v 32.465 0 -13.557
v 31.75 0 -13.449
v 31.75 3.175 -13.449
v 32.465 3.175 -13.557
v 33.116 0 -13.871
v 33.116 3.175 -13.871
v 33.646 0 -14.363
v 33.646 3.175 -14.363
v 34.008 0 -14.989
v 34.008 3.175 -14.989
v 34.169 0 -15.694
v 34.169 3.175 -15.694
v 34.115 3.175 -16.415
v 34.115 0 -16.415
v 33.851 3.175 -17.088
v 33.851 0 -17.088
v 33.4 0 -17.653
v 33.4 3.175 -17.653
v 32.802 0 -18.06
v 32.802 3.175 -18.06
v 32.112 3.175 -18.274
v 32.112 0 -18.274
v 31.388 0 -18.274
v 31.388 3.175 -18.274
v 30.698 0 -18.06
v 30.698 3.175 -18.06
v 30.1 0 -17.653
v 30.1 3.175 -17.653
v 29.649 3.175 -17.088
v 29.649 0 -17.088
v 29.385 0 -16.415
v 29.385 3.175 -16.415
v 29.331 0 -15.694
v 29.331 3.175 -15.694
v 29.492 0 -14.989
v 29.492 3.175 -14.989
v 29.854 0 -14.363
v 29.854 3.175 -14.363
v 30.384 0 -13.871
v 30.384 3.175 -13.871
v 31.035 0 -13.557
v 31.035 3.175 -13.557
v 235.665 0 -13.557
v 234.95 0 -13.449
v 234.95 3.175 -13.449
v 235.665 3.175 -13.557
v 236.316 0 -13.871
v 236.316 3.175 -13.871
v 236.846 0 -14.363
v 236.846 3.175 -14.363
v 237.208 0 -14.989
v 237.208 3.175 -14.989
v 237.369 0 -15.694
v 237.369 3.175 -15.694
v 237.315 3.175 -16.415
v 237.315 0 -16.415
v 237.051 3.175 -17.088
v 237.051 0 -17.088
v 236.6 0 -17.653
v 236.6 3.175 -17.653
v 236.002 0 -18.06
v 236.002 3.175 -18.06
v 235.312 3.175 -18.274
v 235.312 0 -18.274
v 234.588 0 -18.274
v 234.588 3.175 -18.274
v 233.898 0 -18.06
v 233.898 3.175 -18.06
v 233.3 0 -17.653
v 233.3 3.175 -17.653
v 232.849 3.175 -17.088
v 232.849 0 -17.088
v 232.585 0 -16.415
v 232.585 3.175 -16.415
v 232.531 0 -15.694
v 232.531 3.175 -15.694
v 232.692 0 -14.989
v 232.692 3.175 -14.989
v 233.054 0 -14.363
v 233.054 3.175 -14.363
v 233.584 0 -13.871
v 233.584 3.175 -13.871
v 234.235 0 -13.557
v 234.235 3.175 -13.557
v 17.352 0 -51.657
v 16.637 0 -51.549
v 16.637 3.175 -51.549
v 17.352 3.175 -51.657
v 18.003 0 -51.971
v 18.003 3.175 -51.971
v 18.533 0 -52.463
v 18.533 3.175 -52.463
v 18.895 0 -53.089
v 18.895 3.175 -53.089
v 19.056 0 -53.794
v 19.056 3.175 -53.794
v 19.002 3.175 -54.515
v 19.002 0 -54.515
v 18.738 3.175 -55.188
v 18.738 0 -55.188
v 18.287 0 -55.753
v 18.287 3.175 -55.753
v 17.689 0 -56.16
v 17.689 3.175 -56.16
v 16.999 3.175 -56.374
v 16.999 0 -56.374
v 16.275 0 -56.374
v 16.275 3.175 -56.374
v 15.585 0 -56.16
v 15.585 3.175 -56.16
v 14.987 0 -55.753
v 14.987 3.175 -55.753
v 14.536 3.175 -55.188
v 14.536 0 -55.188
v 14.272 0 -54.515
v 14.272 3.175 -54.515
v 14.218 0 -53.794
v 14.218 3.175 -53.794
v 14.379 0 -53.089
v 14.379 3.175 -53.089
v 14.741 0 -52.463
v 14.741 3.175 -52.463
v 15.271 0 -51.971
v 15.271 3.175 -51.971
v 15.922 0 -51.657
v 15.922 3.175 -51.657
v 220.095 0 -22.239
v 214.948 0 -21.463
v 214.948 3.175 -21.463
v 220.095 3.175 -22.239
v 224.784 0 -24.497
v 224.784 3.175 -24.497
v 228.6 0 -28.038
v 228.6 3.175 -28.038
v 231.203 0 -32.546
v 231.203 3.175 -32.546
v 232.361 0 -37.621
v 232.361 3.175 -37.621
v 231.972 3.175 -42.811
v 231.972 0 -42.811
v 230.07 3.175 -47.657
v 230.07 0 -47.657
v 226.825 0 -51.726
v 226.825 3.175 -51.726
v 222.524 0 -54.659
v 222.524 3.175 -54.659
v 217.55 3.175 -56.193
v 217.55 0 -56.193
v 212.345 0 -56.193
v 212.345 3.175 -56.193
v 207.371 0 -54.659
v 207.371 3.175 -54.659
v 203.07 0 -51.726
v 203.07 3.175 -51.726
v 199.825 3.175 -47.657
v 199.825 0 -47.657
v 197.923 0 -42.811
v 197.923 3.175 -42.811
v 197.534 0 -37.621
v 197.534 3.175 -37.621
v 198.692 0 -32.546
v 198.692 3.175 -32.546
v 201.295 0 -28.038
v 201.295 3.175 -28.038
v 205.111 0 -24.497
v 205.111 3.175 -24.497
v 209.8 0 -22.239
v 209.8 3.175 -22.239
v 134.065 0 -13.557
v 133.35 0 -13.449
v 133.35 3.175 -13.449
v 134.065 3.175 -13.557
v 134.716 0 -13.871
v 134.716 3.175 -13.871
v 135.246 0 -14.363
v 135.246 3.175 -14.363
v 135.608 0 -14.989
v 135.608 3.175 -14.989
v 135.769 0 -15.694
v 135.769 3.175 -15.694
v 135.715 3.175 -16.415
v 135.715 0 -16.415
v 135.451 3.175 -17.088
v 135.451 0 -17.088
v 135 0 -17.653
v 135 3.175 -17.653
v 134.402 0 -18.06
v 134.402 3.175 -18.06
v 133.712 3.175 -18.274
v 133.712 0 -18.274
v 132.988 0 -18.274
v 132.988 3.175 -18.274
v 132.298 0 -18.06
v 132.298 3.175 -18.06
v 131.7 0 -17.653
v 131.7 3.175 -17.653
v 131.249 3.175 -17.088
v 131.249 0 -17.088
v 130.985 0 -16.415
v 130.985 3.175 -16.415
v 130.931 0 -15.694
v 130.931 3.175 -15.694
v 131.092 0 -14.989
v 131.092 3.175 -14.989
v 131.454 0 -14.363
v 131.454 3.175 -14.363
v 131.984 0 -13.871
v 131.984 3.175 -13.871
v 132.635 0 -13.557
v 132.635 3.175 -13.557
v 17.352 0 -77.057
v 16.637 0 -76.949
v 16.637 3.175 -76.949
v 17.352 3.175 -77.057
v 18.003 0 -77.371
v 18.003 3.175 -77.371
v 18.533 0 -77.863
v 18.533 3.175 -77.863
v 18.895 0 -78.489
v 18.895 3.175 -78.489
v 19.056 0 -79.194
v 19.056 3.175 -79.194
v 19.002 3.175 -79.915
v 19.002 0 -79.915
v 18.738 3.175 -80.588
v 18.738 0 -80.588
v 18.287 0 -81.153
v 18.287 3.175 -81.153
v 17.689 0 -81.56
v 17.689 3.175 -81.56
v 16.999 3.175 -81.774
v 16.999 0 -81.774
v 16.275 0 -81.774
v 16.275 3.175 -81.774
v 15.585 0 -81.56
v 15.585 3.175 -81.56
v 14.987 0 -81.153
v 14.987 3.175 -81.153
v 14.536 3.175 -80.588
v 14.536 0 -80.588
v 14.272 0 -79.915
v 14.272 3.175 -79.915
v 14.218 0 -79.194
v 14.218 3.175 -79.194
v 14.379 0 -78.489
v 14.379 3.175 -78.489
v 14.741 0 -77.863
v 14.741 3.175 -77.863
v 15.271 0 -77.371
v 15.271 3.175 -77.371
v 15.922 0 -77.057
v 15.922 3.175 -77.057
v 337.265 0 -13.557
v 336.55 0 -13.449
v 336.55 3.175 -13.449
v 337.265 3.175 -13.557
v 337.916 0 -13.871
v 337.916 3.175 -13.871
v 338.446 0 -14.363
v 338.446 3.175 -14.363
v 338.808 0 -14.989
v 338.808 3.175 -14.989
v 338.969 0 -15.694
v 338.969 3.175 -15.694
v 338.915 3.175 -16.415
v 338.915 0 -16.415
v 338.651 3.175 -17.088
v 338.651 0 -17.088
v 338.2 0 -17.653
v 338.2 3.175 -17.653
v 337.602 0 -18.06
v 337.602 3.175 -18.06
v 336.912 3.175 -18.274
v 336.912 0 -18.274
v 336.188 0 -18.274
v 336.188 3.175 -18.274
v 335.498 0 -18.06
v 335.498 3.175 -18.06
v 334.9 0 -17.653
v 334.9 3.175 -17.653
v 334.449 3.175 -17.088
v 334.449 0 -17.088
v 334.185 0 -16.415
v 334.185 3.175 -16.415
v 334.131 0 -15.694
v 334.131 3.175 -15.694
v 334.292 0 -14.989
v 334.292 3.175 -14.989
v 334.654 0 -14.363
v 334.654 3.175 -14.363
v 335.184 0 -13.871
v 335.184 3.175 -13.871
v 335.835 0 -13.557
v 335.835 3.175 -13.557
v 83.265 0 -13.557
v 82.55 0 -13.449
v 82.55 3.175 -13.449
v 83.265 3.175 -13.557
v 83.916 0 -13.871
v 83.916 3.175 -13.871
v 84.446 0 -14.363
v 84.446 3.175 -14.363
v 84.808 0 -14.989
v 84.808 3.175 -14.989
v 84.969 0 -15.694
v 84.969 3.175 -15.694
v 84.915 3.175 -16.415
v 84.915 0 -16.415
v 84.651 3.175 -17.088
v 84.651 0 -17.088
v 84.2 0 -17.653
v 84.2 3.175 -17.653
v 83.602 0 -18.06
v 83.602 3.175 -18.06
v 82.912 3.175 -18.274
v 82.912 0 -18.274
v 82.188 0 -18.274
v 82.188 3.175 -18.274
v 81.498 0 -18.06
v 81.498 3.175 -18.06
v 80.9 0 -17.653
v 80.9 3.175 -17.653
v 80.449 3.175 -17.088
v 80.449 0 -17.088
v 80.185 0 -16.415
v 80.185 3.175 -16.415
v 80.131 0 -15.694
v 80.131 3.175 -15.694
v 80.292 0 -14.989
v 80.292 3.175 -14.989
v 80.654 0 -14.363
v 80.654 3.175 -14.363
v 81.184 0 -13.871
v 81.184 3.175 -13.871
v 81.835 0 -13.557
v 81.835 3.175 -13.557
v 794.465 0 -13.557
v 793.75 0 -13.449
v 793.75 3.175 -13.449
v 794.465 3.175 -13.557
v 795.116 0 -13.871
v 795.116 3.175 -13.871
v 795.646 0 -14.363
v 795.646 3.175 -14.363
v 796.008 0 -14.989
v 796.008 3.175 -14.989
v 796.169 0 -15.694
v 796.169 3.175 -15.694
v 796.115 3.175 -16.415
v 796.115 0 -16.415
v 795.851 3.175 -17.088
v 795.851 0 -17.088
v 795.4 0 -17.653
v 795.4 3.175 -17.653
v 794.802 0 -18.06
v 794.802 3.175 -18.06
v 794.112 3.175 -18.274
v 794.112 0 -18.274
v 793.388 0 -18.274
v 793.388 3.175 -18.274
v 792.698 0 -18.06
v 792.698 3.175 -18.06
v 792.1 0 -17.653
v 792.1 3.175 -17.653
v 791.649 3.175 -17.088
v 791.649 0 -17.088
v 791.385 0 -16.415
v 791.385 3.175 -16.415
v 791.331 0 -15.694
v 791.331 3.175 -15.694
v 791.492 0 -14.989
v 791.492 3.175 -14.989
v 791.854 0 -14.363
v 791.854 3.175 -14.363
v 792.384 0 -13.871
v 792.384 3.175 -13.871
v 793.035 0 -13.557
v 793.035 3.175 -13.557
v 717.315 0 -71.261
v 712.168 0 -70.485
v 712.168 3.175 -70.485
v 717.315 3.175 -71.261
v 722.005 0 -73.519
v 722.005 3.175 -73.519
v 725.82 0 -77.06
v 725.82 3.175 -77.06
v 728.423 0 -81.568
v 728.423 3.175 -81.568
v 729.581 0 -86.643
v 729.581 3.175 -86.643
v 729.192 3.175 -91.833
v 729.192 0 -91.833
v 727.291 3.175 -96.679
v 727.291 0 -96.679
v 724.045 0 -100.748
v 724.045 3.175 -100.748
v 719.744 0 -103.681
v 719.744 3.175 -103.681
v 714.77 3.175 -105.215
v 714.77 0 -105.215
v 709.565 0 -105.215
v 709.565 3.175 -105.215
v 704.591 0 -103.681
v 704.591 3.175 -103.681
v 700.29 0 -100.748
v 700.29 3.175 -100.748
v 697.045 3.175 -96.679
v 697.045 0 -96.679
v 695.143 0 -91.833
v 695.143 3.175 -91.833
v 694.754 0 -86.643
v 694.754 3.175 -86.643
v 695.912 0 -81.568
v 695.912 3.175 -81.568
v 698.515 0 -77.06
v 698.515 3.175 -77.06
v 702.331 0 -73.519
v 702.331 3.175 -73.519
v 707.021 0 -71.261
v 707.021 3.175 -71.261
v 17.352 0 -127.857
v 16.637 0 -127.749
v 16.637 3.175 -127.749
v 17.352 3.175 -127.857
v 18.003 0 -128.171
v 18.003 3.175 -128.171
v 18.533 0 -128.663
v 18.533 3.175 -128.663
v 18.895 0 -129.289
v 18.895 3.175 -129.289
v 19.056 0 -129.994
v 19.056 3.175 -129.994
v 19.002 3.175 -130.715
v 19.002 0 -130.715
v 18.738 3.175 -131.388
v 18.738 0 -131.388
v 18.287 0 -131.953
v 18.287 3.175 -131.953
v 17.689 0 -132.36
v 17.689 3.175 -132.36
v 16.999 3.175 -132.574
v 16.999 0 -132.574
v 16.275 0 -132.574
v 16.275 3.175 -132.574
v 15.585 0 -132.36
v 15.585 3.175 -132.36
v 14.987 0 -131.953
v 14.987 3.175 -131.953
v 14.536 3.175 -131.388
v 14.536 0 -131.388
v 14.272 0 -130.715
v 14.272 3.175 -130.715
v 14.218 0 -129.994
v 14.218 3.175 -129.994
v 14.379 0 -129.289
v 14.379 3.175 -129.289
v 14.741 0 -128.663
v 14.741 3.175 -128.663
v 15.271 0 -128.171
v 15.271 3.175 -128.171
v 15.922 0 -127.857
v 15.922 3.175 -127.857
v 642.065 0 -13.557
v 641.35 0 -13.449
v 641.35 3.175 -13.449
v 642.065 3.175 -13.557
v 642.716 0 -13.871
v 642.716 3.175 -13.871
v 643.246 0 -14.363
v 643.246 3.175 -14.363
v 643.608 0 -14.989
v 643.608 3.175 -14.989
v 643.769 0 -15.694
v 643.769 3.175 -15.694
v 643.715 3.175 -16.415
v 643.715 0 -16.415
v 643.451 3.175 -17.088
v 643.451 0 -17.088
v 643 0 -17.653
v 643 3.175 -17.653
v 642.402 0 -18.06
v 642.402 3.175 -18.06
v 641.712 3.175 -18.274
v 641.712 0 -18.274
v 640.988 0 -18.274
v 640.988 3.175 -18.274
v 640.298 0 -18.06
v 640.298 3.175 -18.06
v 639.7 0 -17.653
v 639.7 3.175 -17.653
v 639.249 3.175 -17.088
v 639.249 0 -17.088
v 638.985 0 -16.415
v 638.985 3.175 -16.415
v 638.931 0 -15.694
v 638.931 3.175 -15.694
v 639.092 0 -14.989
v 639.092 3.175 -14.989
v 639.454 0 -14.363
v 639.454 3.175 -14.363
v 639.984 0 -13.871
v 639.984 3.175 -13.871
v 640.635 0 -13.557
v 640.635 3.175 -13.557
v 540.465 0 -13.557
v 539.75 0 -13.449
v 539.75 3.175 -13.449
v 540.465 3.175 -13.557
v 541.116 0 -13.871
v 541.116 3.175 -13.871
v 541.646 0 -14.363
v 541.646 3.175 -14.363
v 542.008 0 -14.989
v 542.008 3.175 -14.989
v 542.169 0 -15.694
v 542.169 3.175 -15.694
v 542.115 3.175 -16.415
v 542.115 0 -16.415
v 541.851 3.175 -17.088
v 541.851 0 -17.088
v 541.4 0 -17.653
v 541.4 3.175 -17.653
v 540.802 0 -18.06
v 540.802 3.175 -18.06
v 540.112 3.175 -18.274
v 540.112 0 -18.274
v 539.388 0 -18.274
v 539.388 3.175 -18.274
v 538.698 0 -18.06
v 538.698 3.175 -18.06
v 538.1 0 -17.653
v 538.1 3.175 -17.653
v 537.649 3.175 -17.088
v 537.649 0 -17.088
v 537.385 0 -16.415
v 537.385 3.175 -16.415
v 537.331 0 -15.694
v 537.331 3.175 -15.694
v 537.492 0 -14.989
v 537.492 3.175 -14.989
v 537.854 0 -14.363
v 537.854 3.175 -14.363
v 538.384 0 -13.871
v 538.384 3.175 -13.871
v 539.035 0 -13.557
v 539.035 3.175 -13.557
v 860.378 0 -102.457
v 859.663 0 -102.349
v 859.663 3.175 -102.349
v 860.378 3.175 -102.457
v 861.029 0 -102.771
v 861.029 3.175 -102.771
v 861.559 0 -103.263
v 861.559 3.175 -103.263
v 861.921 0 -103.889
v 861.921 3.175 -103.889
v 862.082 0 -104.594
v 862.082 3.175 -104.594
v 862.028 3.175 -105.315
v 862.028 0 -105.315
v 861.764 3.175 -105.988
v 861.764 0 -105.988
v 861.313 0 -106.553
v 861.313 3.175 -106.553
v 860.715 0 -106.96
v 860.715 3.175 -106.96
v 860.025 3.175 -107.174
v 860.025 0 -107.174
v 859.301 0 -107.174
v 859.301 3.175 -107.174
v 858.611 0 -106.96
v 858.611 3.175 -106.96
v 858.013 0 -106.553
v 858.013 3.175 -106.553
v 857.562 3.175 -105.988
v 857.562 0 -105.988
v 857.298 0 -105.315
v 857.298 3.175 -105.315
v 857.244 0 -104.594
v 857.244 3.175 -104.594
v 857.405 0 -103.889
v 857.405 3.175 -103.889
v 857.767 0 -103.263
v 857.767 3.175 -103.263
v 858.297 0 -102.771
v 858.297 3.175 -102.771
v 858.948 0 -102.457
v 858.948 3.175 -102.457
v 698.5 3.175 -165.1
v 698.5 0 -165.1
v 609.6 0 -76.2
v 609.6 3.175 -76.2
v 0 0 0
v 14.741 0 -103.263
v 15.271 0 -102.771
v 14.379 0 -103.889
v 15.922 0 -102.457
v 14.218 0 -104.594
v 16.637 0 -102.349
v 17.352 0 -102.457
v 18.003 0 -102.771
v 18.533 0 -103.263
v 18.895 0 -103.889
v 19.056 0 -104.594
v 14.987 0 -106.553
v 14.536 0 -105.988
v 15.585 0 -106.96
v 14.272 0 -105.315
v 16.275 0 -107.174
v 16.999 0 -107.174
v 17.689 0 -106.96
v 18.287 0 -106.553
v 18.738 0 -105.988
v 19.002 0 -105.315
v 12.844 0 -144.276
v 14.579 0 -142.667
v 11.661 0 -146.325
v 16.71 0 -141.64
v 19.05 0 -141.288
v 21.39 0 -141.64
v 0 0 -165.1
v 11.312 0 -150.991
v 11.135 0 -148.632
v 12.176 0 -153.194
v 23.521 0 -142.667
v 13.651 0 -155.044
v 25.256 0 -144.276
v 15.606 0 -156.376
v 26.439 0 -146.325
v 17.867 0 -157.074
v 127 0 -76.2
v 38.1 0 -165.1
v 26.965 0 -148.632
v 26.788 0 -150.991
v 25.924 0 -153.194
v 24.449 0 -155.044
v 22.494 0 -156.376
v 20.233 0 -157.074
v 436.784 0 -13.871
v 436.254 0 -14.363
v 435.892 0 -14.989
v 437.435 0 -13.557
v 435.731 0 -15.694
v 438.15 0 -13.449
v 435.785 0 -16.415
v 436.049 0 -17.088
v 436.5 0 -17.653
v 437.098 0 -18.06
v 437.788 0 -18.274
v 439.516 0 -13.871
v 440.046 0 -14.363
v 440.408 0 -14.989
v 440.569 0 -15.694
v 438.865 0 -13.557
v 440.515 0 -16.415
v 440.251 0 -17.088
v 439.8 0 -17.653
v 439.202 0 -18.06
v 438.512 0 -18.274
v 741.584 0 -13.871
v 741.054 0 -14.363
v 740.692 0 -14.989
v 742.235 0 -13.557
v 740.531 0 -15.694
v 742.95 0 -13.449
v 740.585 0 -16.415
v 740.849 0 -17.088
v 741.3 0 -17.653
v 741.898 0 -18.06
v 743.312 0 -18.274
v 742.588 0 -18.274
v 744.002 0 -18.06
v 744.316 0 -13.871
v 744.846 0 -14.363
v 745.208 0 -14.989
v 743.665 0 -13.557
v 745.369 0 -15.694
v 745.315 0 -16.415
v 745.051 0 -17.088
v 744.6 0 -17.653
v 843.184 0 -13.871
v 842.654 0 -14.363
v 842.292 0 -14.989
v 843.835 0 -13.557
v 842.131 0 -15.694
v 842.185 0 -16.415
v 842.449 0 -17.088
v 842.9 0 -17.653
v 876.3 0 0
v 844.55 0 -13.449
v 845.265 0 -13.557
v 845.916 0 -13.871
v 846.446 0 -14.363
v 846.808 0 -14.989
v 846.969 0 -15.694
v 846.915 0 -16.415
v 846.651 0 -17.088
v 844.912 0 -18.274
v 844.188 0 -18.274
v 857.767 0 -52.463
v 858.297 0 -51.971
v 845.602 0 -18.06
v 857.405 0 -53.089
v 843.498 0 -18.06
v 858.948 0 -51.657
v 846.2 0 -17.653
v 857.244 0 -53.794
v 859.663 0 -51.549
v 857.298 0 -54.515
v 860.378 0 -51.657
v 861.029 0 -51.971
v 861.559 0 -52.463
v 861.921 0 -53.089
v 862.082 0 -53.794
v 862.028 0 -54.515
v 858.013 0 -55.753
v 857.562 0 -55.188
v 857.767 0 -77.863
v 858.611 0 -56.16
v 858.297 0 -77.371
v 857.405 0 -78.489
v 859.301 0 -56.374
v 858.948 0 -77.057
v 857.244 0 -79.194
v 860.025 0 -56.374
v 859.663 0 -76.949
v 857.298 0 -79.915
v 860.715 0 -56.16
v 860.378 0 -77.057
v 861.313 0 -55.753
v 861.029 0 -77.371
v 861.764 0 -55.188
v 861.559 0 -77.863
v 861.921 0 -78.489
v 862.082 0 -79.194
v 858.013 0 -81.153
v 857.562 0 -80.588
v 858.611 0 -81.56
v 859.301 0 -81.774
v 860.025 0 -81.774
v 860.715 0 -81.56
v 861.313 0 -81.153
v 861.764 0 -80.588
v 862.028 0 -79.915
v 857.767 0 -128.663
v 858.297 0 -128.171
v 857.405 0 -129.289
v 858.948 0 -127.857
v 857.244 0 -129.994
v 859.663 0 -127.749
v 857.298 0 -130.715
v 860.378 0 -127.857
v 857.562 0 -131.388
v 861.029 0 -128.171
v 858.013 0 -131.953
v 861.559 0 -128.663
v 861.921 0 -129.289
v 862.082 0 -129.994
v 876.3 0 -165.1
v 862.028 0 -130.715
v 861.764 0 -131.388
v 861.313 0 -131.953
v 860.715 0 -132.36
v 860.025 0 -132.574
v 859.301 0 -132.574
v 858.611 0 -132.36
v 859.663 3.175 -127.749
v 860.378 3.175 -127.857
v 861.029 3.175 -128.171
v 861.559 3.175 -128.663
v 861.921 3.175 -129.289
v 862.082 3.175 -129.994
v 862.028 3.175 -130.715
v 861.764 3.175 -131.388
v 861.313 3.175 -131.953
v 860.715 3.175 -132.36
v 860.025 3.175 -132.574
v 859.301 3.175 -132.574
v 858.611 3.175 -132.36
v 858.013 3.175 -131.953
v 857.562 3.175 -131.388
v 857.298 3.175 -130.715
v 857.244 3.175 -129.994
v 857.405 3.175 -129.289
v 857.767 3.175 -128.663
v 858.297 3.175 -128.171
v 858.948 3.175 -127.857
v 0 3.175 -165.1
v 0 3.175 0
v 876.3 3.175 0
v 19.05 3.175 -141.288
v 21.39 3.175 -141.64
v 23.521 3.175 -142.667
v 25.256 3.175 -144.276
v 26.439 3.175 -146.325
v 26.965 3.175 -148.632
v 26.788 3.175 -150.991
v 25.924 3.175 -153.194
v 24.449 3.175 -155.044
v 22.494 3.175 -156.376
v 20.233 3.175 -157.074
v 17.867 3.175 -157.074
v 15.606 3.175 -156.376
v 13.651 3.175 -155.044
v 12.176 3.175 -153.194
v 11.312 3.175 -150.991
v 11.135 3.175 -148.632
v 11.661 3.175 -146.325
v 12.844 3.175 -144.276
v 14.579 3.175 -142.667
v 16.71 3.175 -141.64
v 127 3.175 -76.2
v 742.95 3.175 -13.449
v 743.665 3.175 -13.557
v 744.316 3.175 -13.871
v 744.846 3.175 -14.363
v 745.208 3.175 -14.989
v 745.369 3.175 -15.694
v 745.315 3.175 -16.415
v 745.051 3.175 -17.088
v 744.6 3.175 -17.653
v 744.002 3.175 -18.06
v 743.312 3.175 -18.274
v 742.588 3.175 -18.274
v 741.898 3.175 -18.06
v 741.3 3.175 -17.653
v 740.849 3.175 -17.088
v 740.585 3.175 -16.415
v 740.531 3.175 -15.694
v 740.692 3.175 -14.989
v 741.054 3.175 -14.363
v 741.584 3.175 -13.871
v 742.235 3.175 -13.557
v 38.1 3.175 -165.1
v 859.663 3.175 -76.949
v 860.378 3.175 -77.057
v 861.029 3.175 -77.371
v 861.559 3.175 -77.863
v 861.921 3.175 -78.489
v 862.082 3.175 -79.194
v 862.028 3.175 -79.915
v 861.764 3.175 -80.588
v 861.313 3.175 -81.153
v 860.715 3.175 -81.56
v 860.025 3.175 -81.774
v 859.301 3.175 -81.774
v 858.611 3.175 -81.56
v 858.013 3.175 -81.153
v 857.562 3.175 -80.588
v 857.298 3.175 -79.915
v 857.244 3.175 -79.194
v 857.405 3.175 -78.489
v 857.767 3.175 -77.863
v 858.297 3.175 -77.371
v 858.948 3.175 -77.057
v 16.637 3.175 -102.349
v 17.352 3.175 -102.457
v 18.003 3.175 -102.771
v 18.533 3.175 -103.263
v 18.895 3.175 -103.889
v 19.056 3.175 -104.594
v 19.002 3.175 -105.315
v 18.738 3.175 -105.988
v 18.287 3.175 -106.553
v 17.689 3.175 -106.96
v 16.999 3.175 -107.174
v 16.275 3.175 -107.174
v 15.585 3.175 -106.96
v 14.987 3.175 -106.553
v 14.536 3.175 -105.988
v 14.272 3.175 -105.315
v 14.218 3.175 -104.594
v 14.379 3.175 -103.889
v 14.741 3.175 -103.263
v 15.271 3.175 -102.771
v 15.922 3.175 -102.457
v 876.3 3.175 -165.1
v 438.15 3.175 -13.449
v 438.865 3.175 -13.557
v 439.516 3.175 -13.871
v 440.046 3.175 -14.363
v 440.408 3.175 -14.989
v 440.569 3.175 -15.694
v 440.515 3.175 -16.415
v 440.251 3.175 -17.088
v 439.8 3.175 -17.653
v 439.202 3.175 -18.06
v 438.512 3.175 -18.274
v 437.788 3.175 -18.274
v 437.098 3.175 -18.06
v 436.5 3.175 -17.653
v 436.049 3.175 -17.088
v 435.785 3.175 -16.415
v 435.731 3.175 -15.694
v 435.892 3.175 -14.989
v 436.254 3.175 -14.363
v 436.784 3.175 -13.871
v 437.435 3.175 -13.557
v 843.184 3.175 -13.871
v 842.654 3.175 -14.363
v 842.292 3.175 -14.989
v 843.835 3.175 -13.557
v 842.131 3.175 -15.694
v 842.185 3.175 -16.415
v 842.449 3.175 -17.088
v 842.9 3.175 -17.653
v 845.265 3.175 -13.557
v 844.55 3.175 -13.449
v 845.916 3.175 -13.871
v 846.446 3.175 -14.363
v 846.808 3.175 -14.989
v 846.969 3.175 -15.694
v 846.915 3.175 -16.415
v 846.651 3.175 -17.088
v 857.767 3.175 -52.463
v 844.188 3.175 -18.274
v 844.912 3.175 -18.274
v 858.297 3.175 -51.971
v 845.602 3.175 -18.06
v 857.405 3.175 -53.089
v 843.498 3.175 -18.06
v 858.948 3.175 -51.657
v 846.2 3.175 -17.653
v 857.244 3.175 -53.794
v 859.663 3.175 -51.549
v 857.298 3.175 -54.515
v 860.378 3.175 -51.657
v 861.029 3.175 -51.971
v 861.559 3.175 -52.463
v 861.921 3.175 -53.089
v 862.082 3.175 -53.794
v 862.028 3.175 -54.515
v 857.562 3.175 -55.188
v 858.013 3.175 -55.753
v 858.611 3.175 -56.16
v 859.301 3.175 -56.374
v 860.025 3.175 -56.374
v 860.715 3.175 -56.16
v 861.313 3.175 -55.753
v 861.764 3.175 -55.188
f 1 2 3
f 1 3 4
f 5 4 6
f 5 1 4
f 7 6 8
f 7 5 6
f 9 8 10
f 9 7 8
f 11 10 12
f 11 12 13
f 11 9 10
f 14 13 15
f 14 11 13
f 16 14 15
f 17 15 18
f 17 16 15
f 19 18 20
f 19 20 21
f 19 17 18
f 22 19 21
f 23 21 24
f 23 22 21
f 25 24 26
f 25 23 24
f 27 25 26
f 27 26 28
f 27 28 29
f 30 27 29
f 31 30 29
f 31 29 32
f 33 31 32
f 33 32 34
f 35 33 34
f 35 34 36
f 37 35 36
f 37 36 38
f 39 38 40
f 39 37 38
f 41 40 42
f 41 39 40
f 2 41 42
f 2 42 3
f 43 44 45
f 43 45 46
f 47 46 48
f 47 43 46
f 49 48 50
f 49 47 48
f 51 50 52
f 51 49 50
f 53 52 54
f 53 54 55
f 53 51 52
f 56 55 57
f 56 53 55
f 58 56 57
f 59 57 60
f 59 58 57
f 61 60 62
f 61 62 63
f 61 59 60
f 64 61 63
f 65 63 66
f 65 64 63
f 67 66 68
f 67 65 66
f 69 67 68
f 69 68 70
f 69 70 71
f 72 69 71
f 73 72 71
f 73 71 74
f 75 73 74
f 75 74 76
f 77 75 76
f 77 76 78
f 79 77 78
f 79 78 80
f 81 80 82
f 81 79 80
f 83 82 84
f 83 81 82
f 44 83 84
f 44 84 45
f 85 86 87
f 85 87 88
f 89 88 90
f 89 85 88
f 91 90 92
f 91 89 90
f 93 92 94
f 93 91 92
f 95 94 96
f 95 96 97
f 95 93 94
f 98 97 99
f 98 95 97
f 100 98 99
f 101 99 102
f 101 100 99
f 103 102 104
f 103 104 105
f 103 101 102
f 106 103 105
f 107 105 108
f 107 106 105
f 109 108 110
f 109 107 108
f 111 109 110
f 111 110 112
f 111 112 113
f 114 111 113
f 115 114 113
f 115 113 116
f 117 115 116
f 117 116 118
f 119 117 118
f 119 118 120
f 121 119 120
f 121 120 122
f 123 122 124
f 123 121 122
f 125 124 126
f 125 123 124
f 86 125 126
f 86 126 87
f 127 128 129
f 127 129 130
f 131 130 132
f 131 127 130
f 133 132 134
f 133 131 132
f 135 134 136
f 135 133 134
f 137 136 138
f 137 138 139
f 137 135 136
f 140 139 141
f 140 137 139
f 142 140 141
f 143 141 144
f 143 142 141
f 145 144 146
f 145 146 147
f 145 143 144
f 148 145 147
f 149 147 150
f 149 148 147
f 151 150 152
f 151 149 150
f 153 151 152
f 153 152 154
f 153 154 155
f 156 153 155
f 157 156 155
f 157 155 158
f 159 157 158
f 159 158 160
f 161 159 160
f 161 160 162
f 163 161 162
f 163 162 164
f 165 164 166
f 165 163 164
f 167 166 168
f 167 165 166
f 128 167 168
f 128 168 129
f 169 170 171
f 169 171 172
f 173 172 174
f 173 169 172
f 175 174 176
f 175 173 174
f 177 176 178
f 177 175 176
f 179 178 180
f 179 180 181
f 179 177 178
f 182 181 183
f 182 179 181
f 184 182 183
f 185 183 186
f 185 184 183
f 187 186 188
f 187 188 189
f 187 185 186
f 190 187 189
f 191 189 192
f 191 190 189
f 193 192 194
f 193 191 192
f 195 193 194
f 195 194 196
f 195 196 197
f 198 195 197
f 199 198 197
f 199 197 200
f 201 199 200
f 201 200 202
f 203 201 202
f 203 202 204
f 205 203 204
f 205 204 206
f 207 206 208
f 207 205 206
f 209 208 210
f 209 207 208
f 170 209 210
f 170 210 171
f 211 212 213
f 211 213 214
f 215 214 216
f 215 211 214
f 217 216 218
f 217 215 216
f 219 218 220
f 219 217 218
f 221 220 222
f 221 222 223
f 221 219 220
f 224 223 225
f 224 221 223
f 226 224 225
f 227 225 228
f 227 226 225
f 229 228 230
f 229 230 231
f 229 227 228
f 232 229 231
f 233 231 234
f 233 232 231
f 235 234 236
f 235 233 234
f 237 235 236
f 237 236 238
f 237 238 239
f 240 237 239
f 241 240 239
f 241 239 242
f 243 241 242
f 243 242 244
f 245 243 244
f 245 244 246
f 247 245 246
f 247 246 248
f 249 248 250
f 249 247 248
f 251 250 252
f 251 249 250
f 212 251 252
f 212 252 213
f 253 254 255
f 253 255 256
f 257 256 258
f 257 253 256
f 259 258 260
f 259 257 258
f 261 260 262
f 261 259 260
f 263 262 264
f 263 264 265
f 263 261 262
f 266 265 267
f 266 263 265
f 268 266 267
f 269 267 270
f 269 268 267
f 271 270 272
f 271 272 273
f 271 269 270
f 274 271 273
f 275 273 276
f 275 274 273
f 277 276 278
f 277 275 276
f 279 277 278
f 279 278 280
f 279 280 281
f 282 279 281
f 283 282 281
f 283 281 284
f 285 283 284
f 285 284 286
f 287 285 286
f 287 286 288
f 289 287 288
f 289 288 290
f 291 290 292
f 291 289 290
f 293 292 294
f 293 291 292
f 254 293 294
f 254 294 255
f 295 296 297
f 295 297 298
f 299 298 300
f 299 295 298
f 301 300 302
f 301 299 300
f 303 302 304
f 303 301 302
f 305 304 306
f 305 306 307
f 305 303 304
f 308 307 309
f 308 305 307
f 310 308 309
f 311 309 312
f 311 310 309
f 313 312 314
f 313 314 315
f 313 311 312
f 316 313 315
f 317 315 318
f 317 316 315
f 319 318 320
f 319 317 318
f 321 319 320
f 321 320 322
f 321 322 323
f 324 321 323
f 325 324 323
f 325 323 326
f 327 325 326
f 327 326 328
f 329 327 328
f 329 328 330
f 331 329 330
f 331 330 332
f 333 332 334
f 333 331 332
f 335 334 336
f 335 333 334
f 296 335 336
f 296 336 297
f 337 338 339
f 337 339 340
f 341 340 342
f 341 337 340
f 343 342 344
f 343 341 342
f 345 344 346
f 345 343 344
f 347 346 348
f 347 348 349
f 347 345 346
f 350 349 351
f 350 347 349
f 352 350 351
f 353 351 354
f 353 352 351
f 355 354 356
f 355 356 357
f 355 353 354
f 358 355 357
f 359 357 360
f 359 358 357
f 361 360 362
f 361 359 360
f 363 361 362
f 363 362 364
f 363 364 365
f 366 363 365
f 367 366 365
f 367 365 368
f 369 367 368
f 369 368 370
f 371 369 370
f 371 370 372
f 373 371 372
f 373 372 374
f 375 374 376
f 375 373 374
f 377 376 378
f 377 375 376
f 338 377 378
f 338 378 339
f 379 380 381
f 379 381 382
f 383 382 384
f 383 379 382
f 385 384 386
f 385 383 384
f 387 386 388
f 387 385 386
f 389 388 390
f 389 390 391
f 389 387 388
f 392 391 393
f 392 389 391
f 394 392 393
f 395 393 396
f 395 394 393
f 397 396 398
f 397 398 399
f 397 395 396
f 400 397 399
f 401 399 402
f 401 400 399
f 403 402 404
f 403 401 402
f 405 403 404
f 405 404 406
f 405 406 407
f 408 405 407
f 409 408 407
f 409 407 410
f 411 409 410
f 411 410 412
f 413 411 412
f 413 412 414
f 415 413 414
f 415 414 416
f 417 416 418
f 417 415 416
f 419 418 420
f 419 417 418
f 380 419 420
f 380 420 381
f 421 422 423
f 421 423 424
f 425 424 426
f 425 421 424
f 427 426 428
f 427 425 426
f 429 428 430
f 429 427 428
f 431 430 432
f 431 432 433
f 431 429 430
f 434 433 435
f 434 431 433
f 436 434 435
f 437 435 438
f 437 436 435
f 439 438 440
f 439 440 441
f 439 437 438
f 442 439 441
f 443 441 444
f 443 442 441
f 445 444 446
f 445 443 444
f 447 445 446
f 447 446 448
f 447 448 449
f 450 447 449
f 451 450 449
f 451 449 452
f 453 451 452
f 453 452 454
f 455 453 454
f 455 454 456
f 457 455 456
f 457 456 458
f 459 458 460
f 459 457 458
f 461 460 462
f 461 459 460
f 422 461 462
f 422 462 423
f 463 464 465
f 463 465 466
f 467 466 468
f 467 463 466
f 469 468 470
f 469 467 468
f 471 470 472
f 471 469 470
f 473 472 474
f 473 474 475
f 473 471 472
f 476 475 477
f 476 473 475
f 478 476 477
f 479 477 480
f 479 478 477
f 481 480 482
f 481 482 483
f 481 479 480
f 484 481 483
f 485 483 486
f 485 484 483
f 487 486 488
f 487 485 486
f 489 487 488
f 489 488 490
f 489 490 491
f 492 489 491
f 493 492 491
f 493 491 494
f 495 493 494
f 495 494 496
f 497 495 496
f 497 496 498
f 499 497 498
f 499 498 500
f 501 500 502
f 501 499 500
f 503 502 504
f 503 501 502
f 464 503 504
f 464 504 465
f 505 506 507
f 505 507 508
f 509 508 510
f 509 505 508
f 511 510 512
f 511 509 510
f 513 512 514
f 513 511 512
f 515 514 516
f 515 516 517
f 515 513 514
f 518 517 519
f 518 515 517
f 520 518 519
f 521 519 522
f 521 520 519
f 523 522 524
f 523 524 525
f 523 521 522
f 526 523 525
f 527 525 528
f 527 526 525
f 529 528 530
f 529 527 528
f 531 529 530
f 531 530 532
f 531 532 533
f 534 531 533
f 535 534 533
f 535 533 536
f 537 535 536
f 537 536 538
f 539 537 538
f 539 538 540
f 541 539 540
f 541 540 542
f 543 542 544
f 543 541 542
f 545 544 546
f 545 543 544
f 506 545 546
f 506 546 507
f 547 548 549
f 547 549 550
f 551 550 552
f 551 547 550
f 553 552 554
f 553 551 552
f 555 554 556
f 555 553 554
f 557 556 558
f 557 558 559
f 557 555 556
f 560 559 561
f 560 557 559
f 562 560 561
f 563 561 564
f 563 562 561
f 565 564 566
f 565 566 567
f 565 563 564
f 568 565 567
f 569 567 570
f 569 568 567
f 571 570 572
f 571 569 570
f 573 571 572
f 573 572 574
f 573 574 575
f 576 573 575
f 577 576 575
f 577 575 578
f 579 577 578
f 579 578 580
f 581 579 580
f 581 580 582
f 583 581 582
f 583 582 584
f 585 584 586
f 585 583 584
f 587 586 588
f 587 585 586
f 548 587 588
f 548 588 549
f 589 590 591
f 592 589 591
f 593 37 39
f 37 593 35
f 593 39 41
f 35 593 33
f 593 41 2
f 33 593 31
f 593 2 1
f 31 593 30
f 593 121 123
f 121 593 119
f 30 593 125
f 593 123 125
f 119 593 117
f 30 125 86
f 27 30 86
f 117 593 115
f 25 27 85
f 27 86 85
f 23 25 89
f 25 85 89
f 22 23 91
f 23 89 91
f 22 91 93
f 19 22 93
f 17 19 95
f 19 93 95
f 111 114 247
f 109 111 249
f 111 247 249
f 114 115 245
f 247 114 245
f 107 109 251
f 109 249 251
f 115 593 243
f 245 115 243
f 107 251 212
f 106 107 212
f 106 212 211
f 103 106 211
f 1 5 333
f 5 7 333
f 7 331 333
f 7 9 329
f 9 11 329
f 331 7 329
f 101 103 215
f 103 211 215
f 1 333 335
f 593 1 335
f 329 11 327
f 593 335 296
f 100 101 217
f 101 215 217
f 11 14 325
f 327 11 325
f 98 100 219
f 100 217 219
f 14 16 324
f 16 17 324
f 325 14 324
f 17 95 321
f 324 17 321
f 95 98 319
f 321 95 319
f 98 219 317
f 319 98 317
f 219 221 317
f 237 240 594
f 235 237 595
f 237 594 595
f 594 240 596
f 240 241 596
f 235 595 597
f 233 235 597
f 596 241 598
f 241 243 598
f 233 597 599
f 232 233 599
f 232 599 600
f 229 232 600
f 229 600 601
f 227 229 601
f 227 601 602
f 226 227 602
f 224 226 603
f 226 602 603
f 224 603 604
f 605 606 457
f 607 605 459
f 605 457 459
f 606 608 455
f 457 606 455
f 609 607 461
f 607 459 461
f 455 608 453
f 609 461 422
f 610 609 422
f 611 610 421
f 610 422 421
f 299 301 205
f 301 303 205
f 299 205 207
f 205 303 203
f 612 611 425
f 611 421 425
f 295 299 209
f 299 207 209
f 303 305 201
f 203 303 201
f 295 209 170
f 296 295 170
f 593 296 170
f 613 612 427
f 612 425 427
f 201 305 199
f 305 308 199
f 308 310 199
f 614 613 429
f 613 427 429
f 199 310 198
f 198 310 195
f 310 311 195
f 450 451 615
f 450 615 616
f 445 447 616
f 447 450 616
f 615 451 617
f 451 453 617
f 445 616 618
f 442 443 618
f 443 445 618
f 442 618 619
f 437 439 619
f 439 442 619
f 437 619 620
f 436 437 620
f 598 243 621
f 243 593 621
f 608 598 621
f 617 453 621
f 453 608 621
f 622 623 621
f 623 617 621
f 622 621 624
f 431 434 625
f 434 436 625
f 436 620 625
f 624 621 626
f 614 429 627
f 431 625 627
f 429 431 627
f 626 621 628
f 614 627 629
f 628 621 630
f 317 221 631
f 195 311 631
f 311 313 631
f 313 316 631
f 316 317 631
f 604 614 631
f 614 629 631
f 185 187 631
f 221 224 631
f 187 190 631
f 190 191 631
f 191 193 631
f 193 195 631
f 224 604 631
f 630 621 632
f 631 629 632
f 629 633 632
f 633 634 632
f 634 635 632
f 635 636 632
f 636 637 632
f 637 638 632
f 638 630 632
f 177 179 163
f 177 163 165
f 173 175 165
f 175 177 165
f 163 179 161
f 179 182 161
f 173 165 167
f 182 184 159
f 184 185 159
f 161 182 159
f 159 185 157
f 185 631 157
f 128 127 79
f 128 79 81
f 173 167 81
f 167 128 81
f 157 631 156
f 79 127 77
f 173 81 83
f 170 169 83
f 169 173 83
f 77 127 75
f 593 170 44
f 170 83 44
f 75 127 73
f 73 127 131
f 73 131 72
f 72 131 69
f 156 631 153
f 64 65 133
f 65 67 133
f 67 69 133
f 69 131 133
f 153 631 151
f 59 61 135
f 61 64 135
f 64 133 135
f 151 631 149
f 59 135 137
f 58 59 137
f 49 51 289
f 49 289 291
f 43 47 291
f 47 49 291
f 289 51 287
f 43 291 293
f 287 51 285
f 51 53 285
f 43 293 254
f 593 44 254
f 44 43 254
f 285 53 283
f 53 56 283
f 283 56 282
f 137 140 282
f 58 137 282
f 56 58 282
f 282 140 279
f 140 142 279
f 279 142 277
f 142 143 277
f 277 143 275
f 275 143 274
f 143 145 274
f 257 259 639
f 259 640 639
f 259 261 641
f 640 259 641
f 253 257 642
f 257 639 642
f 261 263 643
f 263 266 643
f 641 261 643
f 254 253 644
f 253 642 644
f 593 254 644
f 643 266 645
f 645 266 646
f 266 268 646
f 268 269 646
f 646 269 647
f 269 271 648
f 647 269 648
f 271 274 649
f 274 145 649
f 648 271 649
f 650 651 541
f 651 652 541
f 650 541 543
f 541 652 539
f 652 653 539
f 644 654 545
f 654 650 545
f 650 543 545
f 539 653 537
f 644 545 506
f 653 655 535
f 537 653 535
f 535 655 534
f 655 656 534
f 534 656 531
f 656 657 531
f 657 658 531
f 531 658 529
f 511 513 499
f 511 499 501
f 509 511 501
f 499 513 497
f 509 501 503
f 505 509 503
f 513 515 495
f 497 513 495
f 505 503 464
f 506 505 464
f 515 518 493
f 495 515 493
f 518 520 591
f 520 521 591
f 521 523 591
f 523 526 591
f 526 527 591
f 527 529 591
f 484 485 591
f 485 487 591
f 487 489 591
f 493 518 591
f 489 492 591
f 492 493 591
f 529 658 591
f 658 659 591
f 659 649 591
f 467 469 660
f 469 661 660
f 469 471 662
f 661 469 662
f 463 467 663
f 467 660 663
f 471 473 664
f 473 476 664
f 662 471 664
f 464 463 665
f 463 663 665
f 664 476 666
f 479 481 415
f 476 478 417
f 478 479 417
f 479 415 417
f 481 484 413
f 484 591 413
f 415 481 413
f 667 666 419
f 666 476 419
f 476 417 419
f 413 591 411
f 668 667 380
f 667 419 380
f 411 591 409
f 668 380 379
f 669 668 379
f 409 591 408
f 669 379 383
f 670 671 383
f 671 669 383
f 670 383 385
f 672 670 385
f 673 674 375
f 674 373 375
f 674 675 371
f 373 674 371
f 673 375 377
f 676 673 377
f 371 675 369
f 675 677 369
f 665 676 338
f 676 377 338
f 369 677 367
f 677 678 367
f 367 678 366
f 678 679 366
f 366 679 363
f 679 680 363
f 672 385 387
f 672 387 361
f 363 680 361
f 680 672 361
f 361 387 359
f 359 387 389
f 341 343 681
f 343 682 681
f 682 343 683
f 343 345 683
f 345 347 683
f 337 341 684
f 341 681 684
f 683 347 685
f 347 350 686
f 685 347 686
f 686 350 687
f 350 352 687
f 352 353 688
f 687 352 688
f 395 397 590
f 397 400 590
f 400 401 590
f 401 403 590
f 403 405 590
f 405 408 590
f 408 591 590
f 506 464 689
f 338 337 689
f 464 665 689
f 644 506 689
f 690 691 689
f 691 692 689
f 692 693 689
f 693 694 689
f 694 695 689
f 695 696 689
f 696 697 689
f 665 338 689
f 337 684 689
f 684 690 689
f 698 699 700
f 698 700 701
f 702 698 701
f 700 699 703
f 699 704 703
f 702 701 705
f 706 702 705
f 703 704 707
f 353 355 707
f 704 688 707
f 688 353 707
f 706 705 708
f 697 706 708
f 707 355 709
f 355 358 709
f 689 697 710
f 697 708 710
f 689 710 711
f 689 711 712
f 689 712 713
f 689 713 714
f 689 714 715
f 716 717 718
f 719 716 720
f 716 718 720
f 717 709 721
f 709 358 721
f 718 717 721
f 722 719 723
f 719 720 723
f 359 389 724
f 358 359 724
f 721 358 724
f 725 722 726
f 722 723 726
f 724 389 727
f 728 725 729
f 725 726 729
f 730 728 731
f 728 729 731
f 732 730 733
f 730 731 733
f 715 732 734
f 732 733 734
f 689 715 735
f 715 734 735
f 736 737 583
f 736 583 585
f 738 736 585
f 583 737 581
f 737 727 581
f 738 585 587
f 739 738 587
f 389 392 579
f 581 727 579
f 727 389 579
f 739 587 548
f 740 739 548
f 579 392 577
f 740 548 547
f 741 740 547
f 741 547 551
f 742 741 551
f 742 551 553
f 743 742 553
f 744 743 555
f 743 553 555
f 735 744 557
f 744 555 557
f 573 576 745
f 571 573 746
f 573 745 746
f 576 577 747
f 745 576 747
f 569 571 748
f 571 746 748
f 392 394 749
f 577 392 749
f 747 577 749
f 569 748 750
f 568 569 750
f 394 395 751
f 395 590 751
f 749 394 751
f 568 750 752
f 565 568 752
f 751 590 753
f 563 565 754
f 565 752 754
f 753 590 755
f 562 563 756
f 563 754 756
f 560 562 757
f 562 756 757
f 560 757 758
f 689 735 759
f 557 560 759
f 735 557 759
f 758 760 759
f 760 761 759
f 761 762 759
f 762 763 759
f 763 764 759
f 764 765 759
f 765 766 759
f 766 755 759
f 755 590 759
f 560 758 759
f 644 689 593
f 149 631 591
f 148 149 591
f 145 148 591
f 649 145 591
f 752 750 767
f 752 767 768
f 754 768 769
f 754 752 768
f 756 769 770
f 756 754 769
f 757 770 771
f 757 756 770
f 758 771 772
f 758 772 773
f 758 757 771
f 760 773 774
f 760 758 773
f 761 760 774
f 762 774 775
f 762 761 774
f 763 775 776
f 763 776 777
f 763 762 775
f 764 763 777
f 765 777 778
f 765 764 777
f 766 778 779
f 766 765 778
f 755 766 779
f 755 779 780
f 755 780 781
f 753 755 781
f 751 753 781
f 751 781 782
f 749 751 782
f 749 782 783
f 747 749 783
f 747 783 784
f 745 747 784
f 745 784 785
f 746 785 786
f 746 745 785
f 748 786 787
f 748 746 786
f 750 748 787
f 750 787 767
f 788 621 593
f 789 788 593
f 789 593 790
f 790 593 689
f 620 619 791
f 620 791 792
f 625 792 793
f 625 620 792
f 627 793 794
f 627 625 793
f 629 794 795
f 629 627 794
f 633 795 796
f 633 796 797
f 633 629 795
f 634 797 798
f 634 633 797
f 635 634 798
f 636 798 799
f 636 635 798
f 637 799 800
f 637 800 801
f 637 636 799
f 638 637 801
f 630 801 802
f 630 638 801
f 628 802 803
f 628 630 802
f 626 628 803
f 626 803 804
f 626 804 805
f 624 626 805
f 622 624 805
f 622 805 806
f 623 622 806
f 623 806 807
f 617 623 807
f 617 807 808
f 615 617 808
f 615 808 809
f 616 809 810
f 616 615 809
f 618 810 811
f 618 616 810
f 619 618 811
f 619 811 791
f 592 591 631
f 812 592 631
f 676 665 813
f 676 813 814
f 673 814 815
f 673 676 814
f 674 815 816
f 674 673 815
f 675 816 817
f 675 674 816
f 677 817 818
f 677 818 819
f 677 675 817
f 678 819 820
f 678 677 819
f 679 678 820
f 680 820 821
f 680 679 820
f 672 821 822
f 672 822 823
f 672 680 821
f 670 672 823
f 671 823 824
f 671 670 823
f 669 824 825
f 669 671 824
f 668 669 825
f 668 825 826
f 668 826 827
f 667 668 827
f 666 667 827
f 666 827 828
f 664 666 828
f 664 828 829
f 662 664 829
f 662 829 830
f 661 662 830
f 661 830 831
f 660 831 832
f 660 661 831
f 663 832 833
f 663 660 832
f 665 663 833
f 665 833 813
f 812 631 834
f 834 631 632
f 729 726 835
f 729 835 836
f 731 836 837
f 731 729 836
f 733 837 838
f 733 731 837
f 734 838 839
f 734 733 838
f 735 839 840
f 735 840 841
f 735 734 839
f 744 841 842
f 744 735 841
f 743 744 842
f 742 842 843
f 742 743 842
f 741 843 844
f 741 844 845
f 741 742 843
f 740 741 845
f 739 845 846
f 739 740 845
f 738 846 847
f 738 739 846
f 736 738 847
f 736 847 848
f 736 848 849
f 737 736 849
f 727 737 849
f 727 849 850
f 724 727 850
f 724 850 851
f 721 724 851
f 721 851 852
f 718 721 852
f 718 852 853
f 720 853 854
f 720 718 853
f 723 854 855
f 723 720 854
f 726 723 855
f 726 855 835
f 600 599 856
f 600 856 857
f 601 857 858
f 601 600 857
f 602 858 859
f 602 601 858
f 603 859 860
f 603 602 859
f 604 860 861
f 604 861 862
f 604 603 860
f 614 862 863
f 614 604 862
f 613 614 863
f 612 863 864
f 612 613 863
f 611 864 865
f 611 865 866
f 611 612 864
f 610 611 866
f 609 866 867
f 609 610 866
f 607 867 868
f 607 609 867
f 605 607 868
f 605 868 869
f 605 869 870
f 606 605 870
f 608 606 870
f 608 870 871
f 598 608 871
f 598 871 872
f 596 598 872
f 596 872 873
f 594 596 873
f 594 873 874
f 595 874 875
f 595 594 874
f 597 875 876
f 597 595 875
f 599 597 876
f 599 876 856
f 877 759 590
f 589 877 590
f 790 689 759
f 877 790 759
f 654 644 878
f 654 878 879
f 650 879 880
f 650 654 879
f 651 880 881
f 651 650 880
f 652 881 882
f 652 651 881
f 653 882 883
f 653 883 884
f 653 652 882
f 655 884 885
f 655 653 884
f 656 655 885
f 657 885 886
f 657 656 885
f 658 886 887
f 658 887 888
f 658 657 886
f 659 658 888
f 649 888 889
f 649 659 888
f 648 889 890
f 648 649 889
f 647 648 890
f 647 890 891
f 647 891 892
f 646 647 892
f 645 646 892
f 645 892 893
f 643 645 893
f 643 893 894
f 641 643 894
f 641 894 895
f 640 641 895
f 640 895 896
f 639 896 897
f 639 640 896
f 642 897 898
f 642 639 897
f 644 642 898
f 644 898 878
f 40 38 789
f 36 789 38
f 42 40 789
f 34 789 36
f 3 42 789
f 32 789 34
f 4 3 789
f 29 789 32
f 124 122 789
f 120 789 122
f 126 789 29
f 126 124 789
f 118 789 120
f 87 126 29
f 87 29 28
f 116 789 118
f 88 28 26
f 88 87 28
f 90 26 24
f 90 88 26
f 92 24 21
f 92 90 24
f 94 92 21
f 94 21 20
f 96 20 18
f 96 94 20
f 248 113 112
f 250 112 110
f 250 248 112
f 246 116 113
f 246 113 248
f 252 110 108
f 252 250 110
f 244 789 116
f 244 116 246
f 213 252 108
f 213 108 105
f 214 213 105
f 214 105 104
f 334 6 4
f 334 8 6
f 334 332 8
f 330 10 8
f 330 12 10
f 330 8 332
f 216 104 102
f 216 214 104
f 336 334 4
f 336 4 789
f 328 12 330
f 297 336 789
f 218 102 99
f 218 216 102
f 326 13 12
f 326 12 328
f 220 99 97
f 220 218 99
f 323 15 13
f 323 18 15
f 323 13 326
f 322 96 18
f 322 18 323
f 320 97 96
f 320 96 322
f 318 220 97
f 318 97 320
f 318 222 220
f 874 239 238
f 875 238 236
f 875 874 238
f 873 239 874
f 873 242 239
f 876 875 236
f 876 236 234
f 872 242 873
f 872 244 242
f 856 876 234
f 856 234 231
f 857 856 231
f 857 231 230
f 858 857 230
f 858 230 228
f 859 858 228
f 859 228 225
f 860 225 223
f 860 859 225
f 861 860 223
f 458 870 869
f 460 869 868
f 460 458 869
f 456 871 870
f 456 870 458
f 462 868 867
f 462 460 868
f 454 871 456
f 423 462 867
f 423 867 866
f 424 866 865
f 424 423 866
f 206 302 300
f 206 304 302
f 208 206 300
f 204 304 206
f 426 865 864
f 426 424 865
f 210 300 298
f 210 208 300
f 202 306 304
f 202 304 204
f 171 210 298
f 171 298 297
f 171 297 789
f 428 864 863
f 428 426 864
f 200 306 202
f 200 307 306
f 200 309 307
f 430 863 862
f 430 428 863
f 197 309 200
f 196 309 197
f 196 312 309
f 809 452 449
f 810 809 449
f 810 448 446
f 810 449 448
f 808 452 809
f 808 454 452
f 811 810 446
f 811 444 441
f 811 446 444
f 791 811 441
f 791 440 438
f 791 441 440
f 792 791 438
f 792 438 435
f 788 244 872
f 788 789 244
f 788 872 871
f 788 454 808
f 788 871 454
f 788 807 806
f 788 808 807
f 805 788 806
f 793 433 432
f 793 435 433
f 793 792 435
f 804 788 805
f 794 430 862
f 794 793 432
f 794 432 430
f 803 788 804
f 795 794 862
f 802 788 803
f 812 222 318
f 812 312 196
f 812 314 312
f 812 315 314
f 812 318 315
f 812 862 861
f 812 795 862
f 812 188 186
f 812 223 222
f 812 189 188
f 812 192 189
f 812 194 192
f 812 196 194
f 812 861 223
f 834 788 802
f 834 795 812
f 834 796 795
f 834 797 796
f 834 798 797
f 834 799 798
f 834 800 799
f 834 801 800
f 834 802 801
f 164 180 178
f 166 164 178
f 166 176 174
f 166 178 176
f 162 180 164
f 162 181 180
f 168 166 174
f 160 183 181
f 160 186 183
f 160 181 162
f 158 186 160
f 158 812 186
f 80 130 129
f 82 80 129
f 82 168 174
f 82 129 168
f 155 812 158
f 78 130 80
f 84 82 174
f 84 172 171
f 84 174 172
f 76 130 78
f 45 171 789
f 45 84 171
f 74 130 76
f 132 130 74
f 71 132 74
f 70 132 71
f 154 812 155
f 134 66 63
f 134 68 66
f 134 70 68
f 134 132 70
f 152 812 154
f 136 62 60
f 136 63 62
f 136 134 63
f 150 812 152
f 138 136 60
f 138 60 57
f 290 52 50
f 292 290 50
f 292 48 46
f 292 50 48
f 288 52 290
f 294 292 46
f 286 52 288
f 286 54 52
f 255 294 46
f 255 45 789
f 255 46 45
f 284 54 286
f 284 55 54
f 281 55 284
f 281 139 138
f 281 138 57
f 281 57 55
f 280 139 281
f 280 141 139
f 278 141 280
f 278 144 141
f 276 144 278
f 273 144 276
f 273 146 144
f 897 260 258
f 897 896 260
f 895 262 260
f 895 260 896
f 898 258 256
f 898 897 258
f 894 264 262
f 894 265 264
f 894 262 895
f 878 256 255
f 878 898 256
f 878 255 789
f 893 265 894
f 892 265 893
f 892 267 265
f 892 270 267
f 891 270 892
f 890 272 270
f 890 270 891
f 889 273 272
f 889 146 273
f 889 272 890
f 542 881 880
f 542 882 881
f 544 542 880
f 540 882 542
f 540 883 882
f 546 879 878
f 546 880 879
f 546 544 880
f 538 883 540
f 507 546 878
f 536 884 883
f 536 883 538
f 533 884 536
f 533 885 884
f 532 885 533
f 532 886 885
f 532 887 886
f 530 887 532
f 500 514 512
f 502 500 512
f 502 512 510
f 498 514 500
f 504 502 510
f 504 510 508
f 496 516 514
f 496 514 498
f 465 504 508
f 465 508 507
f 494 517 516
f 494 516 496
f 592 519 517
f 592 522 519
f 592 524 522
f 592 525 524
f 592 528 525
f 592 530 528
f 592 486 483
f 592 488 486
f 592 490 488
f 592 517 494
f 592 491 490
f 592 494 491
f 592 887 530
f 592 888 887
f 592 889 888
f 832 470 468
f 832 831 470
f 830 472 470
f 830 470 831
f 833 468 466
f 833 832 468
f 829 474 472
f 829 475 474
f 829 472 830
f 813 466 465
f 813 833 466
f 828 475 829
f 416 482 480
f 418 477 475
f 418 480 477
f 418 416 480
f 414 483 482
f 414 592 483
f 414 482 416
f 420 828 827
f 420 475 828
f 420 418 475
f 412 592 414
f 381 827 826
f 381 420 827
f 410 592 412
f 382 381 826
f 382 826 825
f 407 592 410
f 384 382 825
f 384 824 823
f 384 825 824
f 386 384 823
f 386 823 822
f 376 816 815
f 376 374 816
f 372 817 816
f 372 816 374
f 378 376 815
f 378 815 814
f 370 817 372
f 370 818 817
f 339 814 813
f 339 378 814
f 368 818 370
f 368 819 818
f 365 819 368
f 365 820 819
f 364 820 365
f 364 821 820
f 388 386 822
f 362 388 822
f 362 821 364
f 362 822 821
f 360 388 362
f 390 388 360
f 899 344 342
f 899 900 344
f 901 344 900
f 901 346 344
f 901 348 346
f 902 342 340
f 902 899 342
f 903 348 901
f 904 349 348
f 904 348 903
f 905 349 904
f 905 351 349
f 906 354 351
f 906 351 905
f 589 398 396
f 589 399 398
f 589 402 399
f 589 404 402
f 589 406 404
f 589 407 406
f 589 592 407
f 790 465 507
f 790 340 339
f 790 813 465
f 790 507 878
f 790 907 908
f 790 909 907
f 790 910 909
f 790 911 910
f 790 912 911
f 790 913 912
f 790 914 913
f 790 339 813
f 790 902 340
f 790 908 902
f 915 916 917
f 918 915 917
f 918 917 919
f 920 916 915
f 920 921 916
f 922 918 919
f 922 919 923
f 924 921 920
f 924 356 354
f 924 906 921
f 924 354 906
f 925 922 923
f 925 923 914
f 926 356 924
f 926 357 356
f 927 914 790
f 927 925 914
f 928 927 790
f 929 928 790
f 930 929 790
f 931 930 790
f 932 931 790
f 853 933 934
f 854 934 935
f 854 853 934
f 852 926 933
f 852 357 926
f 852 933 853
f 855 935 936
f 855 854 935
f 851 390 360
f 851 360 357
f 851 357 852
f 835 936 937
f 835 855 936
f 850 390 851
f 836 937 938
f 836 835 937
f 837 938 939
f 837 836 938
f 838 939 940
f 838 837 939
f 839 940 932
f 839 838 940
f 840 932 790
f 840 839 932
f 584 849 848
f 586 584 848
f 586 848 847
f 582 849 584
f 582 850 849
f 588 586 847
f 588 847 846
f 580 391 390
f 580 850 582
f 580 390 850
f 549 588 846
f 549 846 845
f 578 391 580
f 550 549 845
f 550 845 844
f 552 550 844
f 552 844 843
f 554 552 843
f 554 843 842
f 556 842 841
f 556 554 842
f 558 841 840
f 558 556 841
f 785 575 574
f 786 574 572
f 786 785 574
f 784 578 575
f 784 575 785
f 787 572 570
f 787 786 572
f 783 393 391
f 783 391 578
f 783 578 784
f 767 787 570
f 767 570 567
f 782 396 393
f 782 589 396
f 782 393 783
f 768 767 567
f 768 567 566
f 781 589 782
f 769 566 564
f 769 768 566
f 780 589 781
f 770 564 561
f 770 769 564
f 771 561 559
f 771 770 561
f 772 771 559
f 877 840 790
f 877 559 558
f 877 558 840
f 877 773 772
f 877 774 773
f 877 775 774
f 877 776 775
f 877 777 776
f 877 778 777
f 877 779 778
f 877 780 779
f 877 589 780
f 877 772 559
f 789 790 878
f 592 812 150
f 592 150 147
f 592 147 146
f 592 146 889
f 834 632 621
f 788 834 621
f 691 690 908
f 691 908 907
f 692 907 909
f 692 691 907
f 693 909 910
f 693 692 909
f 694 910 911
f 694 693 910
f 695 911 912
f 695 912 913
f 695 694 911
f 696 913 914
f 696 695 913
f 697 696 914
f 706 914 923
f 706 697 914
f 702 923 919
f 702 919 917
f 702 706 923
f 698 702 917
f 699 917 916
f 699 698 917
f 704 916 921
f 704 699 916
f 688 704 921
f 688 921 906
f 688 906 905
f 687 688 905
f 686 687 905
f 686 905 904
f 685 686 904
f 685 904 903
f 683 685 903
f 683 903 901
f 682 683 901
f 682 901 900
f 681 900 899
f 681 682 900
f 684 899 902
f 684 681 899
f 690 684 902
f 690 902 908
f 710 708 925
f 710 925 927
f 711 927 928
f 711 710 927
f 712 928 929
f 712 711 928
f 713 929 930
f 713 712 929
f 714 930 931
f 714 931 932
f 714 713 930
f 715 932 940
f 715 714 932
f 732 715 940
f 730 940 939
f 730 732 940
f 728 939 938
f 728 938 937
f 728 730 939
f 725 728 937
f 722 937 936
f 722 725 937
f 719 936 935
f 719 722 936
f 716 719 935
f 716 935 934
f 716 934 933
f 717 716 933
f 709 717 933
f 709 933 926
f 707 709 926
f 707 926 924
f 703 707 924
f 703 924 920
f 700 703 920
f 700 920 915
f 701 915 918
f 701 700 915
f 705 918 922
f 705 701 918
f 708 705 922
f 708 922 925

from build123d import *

# Parameters (mm, degrees)
SKETCH1_R           = 17.4625
SKETCH1_R_2         = 2.4257
SKETCH1_R_3         = 7.9375
BOSS_EXTRUDE1_DEPTH = 3.175


with BuildPart() as part:
    # Sketch1 → Boss-Extrude1 (new body)
    with BuildSketch(Plane(origin=(0, 0, 0), x_dir=(1, 0, 0), z_dir=(0, 1, 0))):
        Polygon((0, 0), (876.3, 0), (876.3, 165.1), (698.5, 165.1), (609.6, 76.2), (127, 76.2), (38.1, 165.1), (0, 165.1), align=None)
        with Locations(Location((214.9475, 38.9255, 0), (0, 0, 270))):
            Circle(SKETCH1_R, mode=Mode.SUBTRACT)
        with Locations(Location((712.16774, 87.9475, 0), (0, 0, 270))):
            Circle(SKETCH1_R, mode=Mode.SUBTRACT)
        with Locations(Location((438.15, 15.875, 0), (0, 0, 270))):
            Circle(SKETCH1_R_2, mode=Mode.SUBTRACT)
        with Locations(Location((539.75, 15.875, 0), (0, 0, 270))):
            Circle(SKETCH1_R_2, mode=Mode.SUBTRACT)
        with Locations(Location((641.35, 15.875, 0), (0, 0, 270))):
            Circle(SKETCH1_R_2, mode=Mode.SUBTRACT)
        with Locations(Location((742.95, 15.875, 0), (0, 0, 270))):
            Circle(SKETCH1_R_2, mode=Mode.SUBTRACT)
        with Locations(Location((844.55, 15.875, 0), (0, 0, 270))):
            Circle(SKETCH1_R_2, mode=Mode.SUBTRACT)
        with Locations(Location((31.75, 15.875, 0), (0, 0, 270))):
            Circle(SKETCH1_R_2, mode=Mode.SUBTRACT)
        with Locations(Location((133.35, 15.875, 0), (0, 0, 270))):
            Circle(SKETCH1_R_2, mode=Mode.SUBTRACT)
        with Locations(Location((234.95, 15.875, 0), (0, 0, 270))):
            Circle(SKETCH1_R_2, mode=Mode.SUBTRACT)
        with Locations(Location((336.55, 15.875, 0), (0, 0, 270))):
            Circle(SKETCH1_R_2, mode=Mode.SUBTRACT)
        with Locations(Location((16.637, 53.975, 0), (0, 0, 270))):
            Circle(SKETCH1_R_2, mode=Mode.SUBTRACT)
        with Locations(Location((16.637, 79.375, 0), (0, 0, 270))):
            Circle(SKETCH1_R_2, mode=Mode.SUBTRACT)
        with Locations(Location((16.637, 104.775, 0), (0, 0, 270))):
            Circle(SKETCH1_R_2, mode=Mode.SUBTRACT)
        with Locations(Location((16.637, 130.175, 0), (0, 0, 270))):
            Circle(SKETCH1_R_2, mode=Mode.SUBTRACT)
        with Locations(Location((859.663, 53.975, 0), (0, 0, 270))):
            Circle(SKETCH1_R_2, mode=Mode.SUBTRACT)
        with Locations(Location((859.663, 79.375, 0), (0, 0, 270))):
            Circle(SKETCH1_R_2, mode=Mode.SUBTRACT)
        with Locations(Location((859.663, 104.775, 0), (0, 0, 270))):
            Circle(SKETCH1_R_2, mode=Mode.SUBTRACT)
        with Locations(Location((859.663, 130.175, 0), (0, 0, 270))):
            Circle(SKETCH1_R_2, mode=Mode.SUBTRACT)
        with Locations(Location((82.55, 15.875, 0), (0, 0, 270))):
            Circle(SKETCH1_R_2, mode=Mode.SUBTRACT)
        with Locations(Location((793.75, 15.875, 0), (0, 0, 270))):
            Circle(SKETCH1_R_2, mode=Mode.SUBTRACT)
        with Locations(Location((19.05, 149.225, 0), (0, 0, 270))):
            Circle(SKETCH1_R_3, mode=Mode.SUBTRACT)
    extrude(amount=BOSS_EXTRUDE1_DEPTH)


solid = part.part
